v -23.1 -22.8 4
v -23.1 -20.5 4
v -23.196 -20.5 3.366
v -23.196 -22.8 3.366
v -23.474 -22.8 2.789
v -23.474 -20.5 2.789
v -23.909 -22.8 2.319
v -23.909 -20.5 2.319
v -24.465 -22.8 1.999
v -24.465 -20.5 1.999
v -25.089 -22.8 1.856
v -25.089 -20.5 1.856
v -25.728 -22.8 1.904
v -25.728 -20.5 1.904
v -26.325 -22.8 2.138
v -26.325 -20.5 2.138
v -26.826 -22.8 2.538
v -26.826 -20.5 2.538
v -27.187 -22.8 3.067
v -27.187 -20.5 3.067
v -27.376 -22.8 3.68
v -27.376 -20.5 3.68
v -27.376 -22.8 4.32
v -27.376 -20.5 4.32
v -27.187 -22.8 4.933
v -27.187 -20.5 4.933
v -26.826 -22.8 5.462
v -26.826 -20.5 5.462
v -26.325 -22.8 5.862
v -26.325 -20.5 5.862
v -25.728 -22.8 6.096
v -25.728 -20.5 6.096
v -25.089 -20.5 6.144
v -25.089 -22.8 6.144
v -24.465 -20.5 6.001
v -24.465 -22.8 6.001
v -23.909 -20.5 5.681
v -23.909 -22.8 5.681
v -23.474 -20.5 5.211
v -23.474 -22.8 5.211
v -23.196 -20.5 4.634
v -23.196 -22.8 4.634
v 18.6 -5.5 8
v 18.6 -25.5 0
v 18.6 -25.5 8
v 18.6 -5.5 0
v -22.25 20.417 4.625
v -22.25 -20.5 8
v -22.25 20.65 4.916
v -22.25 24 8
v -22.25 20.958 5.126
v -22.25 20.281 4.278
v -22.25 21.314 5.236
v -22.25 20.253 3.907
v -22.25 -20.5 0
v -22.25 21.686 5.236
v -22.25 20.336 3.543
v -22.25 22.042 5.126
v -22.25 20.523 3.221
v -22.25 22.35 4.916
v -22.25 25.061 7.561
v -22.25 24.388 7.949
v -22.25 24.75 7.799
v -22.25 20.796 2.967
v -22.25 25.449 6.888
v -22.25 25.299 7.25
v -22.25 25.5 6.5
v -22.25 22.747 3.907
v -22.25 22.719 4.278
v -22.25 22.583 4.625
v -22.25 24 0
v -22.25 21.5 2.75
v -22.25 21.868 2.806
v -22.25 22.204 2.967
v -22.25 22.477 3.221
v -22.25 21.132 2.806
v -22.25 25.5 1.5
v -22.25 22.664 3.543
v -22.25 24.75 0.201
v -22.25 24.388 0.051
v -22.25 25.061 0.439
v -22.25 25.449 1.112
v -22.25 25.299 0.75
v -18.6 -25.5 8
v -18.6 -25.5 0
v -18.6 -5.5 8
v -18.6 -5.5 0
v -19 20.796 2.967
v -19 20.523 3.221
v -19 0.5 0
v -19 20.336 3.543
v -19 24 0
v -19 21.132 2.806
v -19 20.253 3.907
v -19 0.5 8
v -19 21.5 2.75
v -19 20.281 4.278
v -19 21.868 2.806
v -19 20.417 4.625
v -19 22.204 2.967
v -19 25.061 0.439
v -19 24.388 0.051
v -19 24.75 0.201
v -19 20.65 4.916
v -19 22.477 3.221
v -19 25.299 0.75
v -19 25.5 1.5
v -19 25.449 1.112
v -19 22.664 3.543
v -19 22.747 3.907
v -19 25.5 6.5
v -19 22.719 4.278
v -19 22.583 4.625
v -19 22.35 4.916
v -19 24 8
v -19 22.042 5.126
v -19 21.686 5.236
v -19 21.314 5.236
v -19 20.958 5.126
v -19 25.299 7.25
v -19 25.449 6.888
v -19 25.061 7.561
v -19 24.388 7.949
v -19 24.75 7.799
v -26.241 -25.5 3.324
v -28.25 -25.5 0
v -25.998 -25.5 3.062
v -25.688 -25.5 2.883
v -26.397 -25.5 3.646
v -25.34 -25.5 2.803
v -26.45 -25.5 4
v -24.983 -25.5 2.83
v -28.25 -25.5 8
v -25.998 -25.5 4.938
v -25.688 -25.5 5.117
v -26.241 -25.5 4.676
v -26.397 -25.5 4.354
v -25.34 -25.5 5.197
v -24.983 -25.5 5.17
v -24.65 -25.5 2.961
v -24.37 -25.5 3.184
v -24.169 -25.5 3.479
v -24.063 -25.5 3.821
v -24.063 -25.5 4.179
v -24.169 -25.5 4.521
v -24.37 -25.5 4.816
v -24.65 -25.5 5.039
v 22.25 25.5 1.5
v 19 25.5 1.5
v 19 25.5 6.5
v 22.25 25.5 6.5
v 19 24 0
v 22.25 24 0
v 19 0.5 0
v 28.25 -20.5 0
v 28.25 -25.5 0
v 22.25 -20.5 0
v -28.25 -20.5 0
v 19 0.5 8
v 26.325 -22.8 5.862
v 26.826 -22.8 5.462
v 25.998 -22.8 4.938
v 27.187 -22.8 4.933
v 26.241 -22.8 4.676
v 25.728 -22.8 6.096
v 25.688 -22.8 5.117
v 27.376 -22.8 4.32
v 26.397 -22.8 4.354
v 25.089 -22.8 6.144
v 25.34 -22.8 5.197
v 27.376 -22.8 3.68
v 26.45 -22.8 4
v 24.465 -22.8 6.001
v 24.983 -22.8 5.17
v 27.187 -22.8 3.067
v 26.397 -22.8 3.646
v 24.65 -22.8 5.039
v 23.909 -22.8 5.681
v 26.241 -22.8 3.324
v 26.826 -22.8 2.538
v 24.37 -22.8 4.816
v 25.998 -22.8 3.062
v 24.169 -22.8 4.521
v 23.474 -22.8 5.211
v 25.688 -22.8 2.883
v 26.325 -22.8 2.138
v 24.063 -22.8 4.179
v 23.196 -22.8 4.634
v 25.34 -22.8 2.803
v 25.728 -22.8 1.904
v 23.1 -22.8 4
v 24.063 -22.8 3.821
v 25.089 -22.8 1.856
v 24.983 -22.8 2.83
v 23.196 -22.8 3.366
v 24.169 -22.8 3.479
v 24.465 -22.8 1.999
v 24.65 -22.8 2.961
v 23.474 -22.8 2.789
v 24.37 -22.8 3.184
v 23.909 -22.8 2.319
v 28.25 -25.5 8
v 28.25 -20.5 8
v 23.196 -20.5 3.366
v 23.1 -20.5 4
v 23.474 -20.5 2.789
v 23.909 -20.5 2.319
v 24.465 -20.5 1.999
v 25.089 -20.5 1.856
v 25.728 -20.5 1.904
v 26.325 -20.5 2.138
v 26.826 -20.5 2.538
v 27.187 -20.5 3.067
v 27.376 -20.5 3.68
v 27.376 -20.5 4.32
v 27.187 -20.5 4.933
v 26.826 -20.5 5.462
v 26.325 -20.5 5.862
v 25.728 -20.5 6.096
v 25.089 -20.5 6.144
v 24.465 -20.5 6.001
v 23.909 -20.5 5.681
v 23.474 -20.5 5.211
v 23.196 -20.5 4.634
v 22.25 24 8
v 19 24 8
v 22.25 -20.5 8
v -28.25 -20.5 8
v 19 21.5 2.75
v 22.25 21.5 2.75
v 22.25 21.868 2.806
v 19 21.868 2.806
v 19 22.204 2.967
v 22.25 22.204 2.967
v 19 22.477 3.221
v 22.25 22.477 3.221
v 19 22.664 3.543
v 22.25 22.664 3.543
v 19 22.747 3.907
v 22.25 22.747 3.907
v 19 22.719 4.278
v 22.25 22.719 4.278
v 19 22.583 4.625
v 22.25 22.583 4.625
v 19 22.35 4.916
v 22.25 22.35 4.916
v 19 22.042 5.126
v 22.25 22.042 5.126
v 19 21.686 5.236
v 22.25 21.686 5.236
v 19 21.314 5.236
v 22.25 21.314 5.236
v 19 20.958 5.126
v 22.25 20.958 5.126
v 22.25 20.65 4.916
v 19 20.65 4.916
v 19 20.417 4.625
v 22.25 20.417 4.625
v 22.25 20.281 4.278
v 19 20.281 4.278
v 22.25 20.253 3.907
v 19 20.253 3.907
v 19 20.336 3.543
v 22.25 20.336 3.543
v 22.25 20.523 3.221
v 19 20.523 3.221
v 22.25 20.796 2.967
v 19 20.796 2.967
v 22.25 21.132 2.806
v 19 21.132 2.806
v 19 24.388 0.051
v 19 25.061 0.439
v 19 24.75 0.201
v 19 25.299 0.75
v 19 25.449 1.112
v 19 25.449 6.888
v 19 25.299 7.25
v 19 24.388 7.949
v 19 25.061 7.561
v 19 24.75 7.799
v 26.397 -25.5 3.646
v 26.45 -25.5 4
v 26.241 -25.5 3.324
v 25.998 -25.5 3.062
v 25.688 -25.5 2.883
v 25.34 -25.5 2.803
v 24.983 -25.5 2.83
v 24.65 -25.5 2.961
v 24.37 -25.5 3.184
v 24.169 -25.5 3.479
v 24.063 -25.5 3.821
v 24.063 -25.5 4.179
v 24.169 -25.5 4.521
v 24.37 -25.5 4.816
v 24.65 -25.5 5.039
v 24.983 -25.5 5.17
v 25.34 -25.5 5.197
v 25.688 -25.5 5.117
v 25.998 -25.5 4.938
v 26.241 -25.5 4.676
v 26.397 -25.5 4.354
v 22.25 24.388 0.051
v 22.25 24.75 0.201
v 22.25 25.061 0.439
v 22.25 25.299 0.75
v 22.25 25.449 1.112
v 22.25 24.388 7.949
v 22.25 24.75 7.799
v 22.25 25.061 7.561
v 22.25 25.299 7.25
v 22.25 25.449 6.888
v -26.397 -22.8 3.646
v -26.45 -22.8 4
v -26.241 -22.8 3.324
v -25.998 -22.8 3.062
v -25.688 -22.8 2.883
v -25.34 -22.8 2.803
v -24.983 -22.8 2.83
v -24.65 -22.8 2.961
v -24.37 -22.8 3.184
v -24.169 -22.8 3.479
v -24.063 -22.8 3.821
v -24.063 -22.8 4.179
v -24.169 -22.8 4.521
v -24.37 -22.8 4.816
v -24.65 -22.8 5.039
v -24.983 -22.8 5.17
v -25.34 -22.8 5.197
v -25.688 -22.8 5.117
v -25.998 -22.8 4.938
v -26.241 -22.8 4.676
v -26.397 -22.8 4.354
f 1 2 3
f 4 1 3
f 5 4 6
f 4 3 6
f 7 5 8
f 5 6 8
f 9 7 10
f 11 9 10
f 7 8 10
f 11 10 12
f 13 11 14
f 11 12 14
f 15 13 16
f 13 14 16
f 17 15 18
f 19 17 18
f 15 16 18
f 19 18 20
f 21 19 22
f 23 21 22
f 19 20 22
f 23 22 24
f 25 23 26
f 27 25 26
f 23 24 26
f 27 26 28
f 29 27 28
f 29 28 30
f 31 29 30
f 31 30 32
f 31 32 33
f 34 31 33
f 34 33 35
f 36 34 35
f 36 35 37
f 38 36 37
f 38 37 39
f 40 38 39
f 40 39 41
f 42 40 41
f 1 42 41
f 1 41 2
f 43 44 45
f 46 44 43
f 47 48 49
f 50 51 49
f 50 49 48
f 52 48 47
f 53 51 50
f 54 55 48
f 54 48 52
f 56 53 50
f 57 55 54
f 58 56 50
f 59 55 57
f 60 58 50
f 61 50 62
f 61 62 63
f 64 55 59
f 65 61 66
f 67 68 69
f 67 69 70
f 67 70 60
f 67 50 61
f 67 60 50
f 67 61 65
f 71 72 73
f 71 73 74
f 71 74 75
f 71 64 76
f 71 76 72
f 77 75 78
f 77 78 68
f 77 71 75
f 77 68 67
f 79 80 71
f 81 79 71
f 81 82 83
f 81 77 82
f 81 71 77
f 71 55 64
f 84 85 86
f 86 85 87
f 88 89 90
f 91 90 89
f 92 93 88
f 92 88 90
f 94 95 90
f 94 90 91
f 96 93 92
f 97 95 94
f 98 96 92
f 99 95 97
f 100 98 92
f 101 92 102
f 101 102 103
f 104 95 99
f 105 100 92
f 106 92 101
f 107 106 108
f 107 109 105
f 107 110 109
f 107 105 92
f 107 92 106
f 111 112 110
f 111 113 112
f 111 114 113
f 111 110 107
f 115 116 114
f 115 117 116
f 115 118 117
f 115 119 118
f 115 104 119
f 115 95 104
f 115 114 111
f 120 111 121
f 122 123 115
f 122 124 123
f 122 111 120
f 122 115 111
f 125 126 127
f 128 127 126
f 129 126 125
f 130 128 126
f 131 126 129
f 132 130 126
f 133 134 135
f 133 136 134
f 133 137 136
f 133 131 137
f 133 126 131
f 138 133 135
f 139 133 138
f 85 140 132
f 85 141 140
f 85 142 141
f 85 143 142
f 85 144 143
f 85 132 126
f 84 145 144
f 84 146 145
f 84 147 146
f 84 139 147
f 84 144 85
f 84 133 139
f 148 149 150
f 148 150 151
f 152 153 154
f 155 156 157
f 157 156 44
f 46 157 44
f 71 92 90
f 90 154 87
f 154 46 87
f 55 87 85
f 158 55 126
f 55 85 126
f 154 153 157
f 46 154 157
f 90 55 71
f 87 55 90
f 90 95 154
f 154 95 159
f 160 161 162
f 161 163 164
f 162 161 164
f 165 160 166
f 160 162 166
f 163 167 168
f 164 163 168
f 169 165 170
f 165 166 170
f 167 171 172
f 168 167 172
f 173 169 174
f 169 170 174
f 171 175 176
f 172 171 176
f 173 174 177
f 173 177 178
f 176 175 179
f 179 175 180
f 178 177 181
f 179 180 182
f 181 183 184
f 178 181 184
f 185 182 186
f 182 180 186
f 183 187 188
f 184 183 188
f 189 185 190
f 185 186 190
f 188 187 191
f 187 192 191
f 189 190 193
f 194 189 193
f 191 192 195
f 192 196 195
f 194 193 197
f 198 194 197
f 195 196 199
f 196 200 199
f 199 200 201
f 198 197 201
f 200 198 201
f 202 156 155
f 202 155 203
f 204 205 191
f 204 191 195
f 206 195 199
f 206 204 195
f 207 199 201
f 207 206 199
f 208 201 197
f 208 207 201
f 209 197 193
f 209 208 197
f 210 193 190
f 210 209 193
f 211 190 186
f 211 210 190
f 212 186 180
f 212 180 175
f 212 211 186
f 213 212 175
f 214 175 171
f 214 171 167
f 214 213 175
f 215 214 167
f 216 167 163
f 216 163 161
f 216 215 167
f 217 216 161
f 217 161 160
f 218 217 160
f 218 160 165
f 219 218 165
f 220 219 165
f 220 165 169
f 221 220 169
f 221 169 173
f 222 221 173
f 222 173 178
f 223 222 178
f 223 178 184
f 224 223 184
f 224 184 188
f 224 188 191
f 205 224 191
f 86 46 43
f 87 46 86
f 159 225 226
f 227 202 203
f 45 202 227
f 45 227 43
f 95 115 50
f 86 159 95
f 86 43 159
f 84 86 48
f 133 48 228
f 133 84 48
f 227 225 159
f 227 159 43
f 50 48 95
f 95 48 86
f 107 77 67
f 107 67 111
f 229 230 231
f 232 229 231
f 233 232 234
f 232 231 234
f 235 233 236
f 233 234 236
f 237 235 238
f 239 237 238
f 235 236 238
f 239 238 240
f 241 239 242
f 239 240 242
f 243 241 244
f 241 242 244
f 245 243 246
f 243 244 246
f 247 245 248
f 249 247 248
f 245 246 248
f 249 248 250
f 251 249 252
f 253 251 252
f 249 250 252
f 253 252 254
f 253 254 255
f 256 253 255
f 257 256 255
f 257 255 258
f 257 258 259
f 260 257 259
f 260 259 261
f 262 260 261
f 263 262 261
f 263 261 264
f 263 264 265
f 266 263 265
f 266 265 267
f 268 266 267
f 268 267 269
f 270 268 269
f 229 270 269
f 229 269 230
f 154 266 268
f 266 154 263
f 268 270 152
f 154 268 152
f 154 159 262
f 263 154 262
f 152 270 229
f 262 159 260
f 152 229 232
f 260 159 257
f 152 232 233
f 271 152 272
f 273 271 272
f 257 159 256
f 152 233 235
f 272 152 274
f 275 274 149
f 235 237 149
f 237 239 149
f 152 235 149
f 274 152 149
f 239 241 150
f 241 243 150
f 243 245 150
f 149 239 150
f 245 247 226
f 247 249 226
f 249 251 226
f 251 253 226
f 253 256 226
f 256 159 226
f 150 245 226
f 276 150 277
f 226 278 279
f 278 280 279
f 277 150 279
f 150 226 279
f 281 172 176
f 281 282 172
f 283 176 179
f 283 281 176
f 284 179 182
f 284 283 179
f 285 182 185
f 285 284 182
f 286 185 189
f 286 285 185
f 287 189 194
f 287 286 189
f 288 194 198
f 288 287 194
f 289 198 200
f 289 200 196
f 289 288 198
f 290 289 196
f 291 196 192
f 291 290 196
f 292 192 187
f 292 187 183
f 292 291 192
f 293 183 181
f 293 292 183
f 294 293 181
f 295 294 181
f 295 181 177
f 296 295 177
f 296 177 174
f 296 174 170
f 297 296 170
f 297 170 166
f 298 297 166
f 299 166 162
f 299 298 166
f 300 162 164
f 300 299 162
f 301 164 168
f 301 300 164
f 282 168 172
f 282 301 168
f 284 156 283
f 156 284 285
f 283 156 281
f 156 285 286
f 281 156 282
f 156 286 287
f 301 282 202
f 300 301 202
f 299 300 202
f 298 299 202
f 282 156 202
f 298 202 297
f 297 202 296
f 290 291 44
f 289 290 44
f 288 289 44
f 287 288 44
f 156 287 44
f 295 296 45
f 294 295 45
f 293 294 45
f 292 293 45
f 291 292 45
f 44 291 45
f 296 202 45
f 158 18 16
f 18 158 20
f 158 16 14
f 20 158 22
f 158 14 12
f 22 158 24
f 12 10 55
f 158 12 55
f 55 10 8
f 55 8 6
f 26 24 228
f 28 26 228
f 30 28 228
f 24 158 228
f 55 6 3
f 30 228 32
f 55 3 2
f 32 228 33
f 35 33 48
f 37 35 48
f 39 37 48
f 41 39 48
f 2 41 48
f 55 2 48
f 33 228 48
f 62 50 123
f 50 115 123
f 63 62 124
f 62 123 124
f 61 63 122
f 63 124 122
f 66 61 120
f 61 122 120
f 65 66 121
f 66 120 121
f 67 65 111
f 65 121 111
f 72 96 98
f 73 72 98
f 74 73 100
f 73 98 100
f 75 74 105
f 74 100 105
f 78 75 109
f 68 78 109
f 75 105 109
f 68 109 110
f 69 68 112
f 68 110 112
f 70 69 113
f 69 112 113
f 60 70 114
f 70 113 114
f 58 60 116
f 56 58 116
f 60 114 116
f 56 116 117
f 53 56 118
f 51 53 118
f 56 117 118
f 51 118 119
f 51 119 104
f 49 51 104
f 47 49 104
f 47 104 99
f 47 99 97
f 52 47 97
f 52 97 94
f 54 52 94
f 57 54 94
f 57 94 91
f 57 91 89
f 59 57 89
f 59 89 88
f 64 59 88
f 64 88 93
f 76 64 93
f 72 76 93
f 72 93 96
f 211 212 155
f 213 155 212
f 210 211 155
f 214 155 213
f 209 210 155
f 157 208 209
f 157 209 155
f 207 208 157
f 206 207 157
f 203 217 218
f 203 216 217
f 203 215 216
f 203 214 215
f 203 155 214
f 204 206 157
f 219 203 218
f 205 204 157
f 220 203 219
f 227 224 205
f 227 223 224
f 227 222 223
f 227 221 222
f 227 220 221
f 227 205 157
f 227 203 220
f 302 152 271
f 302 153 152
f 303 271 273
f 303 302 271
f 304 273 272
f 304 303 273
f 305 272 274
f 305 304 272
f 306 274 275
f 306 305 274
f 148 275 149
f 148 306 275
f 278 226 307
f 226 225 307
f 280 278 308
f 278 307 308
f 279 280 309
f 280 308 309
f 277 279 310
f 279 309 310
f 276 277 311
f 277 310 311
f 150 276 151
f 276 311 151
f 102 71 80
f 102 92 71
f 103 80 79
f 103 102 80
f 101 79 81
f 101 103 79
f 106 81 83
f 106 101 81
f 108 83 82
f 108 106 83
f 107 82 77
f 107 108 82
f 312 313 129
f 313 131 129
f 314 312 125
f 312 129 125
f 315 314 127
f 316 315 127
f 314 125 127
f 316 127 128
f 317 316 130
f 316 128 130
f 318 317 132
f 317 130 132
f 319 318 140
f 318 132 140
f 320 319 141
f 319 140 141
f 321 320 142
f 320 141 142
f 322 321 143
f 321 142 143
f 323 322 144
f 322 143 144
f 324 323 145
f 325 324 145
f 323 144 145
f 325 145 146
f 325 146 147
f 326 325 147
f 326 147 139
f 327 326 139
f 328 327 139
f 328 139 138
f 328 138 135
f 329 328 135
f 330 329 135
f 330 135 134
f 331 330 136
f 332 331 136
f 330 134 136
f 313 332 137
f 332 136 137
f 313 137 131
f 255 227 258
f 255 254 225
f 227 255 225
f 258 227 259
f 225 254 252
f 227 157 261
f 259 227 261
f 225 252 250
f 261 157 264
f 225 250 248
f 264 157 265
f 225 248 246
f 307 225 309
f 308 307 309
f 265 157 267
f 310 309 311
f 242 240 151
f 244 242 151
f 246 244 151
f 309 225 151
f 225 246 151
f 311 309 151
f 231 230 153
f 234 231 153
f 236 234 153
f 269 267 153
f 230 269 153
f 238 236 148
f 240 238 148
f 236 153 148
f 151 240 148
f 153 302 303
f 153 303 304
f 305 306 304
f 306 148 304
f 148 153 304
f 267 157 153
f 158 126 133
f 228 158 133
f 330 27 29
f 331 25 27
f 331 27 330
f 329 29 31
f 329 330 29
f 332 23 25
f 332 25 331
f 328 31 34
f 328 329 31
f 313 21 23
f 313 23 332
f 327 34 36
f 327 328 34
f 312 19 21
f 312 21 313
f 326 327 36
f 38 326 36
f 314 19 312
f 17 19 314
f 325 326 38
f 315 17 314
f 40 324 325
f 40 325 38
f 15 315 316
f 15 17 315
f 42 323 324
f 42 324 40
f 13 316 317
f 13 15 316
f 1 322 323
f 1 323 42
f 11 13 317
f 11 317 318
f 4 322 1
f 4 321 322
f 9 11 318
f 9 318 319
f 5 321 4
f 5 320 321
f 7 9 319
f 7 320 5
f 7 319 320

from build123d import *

# Parameters (mm, degrees)
SKETCH_1_W                = 44.5
SKETCH_1_H                = 51
EXTRUDE_1_DEPTH           = 8
SKETCH_2_W                = 38
SKETCH_2_H                = 25
CUT_EXTRUDE_1_DEPTH       = 9
MM_1_D                    = 2.5
FILLET_1_R                = 1.5
SKETCH_5_W                = 37.2
SKETCH_5_H                = 20
CUT_EXTRUDE_2_DEPTH       = 15
SKETCH_6_W                = 6
SKETCH_6_H                = 8
EXTRUDE_2_DEPTH           = 5
HOLE_WIZARD_2_D           = 2.4
HOLE_WIZARD_2_CBORE_D     = 4.3
HOLE_WIZARD_2_CBORE_DEPTH = 2.3


with BuildPart() as part:
    # 草图1 → 凸台-拉伸1 (new body)
    with BuildSketch(Plane.XY):
        Rectangle(SKETCH_1_W, SKETCH_1_H)
    extrude(amount=EXTRUDE_1_DEPTH)

    # 草图2 → 切除-拉伸1 (cut, through all)
    with BuildSketch(Plane.XY.offset(8)):
        with Locations((0, 13)):
            Rectangle(SKETCH_2_W, SKETCH_2_H)
    extrude(amount=-CUT_EXTRUDE_1_DEPTH, mode=Mode.SUBTRACT)

    # 大小mm 暗销孔1 (through all)
    with Locations(Plane.ZY.offset(22.25)):
        with Locations((4, 21.5)):
            Hole(MM_1_D / 2)

    # 圆角1
    fillet_1_edges = [part.edges().sort_by_distance(p)[0] for p in [
        (20.625, 25.5, 8),
        (-20.625, 25.5, 0),
        (-20.625, 25.5, 8),
        (20.625, 25.5, 0),
    ]]
    fillet(fillet_1_edges, radius=FILLET_1_R)

    # 草图5 → 切除-拉伸2 (cut)
    with BuildSketch(Plane(origin=(0, 0, 0), x_dir=(-1, 0, 0), z_dir=(0, 0, -1))):
        with Locations((0, -15.5)):
            Rectangle(SKETCH_5_W, SKETCH_5_H)
    extrude(amount=-CUT_EXTRUDE_2_DEPTH, mode=Mode.SUBTRACT)

    # 草图6 → 凸台-拉伸2 (add)
    with BuildSketch(Plane.XZ.offset(25.5)):
        with Locations((-25.25, 4)):
            Rectangle(SKETCH_6_W, SKETCH_6_H)
    extrude_2 = extrude(amount=-EXTRUDE_2_DEPTH)

    # 镜向1: 凸台-拉伸2 across plane
    add(extrude_2.mirror(Plane(origin=(0, 0, 0), x_dir=(0, 0, 1), z_dir=(1, 0, 0))))

    # 打孔尺寸(%根据)内六角圆柱头螺钉的类型2 (through all)
    with Locations(Plane(origin=(0, -20.5, 0), x_dir=(1, 0, 0), z_dir=(0, 1, 0))):
        with Locations((-25.25, -4)):
            hole_wizard_2 = CounterBoreHole(HOLE_WIZARD_2_D / 2, HOLE_WIZARD_2_CBORE_D / 2, HOLE_WIZARD_2_CBORE_DEPTH)

    # 镜向2: 打孔尺寸(%根据)内六角圆柱头螺钉的类型2 across plane
    add(hole_wizard_2.mirror(Plane(origin=(0, 0, 0), x_dir=(0, 0, 1), z_dir=(1, 0, 0))), mode=Mode.SUBTRACT)


solid = part.part
